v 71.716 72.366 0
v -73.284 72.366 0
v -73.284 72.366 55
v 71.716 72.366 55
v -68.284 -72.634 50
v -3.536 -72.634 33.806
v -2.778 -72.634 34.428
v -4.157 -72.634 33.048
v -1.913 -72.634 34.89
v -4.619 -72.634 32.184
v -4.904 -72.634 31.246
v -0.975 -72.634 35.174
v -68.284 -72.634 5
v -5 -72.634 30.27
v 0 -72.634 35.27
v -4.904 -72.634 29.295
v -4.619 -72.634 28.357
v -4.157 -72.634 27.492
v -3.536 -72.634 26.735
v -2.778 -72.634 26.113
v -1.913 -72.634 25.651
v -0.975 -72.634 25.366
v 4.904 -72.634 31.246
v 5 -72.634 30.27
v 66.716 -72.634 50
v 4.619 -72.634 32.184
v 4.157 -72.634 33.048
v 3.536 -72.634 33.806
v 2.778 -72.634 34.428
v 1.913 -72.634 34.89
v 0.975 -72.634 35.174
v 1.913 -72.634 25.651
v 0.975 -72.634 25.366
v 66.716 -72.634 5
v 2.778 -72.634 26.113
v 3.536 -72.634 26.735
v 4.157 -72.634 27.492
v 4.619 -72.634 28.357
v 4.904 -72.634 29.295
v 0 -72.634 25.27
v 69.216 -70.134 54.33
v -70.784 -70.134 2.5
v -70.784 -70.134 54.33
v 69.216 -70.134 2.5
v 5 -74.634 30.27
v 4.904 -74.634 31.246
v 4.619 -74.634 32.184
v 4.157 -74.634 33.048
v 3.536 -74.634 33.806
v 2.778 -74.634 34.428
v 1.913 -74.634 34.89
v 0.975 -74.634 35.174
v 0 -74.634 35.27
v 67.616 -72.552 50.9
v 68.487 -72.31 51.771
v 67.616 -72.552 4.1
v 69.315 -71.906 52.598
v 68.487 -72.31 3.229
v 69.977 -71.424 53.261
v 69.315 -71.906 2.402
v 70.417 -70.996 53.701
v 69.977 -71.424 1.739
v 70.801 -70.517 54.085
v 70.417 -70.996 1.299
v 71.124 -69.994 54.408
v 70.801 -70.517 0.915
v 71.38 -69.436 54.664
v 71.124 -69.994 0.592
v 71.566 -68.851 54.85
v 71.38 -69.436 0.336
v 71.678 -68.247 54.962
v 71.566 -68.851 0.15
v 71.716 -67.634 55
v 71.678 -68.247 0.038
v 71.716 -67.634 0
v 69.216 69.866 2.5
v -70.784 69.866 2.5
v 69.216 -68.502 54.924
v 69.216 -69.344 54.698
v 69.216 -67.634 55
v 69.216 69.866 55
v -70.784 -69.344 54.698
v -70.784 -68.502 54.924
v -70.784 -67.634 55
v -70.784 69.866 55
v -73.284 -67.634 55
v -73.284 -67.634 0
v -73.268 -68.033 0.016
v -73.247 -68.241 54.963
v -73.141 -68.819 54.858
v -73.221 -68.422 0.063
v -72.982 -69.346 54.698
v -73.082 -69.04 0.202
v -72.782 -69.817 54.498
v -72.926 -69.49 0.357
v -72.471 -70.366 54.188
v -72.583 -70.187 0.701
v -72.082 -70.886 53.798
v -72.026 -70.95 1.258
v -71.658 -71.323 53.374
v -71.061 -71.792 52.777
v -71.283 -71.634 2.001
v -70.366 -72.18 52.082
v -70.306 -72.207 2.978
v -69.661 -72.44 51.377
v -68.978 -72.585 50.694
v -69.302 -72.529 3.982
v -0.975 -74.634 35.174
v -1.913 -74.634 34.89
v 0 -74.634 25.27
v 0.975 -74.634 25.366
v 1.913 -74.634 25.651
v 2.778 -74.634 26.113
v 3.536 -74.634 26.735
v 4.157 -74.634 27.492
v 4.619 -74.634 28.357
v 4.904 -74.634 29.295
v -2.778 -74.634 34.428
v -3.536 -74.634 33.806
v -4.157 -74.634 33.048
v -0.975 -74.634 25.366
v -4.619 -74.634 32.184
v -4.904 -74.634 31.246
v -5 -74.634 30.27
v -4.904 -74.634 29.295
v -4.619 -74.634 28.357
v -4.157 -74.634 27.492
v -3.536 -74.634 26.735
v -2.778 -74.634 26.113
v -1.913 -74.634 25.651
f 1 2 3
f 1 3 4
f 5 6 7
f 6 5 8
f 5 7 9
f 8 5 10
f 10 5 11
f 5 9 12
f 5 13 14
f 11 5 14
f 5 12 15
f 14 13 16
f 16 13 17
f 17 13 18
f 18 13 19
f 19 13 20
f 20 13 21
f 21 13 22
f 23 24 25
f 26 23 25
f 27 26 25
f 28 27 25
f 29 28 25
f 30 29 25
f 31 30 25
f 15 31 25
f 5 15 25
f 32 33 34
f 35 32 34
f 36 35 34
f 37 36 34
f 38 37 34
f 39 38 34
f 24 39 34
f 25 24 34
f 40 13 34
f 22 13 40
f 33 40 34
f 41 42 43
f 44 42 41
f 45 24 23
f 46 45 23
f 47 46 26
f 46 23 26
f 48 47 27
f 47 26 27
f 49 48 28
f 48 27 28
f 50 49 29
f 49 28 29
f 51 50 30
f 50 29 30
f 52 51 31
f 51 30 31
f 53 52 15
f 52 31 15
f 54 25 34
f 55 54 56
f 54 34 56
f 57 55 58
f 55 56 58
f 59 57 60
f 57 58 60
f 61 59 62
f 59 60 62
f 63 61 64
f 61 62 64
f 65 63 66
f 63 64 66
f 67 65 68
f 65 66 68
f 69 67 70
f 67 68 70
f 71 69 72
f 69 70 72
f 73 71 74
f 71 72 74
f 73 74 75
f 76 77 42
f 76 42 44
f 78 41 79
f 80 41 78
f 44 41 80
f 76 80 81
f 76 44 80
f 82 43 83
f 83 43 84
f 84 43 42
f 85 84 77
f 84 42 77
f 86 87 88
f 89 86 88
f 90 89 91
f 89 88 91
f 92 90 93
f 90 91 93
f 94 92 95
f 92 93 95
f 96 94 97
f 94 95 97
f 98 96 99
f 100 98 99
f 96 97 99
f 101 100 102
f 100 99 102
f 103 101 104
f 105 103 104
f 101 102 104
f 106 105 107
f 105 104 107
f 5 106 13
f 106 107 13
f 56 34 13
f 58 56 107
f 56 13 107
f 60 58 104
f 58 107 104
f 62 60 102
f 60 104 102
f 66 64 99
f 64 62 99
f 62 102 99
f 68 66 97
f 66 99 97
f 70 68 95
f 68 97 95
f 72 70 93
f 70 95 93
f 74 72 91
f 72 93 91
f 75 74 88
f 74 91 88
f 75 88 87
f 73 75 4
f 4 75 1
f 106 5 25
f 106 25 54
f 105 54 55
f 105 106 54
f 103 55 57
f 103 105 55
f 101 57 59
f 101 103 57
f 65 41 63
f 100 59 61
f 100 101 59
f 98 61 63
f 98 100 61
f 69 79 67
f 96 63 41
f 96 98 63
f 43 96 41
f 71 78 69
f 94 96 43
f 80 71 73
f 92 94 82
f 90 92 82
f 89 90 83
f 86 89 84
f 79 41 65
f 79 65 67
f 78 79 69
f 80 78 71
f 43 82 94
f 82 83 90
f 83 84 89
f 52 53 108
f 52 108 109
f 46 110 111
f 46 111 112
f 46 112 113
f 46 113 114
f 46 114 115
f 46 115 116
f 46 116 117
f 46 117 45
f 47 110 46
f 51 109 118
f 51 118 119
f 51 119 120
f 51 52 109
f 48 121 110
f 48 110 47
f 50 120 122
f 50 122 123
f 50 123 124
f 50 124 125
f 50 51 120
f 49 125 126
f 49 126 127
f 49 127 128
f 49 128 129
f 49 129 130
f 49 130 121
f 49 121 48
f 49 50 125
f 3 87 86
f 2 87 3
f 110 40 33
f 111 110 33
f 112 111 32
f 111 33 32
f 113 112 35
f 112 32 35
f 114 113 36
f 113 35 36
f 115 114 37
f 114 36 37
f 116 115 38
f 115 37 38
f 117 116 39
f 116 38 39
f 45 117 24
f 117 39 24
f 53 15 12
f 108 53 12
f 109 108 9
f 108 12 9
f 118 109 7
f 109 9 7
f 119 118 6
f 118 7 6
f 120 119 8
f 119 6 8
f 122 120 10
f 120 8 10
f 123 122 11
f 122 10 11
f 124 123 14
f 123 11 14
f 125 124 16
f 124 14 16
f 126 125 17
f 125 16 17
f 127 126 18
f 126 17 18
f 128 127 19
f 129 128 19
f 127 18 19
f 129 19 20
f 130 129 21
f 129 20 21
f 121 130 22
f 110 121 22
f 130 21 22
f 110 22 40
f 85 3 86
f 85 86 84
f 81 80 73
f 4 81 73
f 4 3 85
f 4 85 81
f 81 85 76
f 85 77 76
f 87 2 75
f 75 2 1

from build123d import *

# Parameters (mm, degrees)
F0_W        = 145
F0_H        = 145
F1_DEPTH    = 55
F2_T        = -2.5
F3_T1_DEPTH = 80
F3_T3_DEPTH = 170
F5_DEPTH    = 2


# Not quite as in the source:
# - a fillet or chamfer that OpenCascade refuses, or shapes differently, is made with other operations: its cross-section is extruded or revolved along the edge and cut away or added


with BuildPart() as f1:
    # F0 (on Top) → F1 (new body)
    with BuildSketch(Plane.XY):
        with Locations((-0.7837880796, -0.1337006688)):
            Rectangle(F0_W, F0_H)
    extrude(amount=F1_DEPTH)

    # F2
    f2_openings = [f1.faces().sort_by_distance(p)[0] for p in [
        (-0.783788, -0.133701, 55),
    ]]
    offset(amount=F2_T, openings=f2_openings)

    # F3: fillet of radius 5 on 4 edges, made by hand

    # F3_s2 → F3_t1 (cut)
    with BuildSketch(Plane.XY.offset(-12.5)):
        with BuildLine():
            ThreePointArc((-73.2837880796, -67.6337006688), (-71.8193219856, -71.1692345747), (-68.2837880796, -72.6337006688))
            Line((-68.2837880796, -72.6337006688), (-73.2837880796, -72.6337006688))
            Line((-73.2837880796, -72.6337006688), (-73.2837880796, -67.6337006688))
        make_face()
        with BuildLine():
            ThreePointArc((66.7162119204, -72.6337006688), (70.2517458263, -71.1692345747), (71.7162119204, -67.6337006688))
            Line((71.7162119204, -67.6337006688), (71.7162119204, -72.6337006688))
            Line((71.7162119204, -72.6337006688), (66.7162119204, -72.6337006688))
        make_face()
    extrude(amount=F3_T1_DEPTH, mode=Mode.SUBTRACT)

    # F3_s4 → F3_t3 (cut)
    with BuildSketch(Plane.YZ.offset(-85.7837880796)):
        with BuildLine():
            ThreePointArc((-72.6337006688, 5), (-71.1692345747, 1.4644660941), (-67.6337006688, 0))
            Line((-67.6337006688, 0), (-72.6337006688, 0))
            Line((-72.6337006688, 0), (-72.6337006688, 5))
        make_face()
        with BuildLine():
            ThreePointArc((-72.6337006688, 50), (-71.1692345747, 53.5355339059), (-67.6337006688, 55))
            Line((-67.6337006688, 55), (-72.6337006688, 55))
            Line((-72.6337006688, 55), (-72.6337006688, 50))
        make_face()
    extrude(amount=F3_T3_DEPTH, mode=Mode.SUBTRACT)

    # F4 (on face) → F5 (join)
    with BuildSketch(Plane.XZ.offset(72.6337006688)):
        with BuildLine():
            ThreePointArc((0, 25.2702692018), (3.5355339059, 26.7347352958), (5, 30.2702692018))
            ThreePointArc((5, 30.2702692018), (3.5355339059, 33.8058031077), (0, 35.2702692018))
            Line((0, 35.2702692018), (0, 25.2702692018))
        make_face()
        with BuildLine():
            Line((0, 25.2702692018), (0, 35.2702692018))
            ThreePointArc((0, 35.2702692018), (-5, 30.2702692018), (0, 25.2702692018))
        make_face()
    extrude(amount=F5_DEPTH)


solid = f1.part
